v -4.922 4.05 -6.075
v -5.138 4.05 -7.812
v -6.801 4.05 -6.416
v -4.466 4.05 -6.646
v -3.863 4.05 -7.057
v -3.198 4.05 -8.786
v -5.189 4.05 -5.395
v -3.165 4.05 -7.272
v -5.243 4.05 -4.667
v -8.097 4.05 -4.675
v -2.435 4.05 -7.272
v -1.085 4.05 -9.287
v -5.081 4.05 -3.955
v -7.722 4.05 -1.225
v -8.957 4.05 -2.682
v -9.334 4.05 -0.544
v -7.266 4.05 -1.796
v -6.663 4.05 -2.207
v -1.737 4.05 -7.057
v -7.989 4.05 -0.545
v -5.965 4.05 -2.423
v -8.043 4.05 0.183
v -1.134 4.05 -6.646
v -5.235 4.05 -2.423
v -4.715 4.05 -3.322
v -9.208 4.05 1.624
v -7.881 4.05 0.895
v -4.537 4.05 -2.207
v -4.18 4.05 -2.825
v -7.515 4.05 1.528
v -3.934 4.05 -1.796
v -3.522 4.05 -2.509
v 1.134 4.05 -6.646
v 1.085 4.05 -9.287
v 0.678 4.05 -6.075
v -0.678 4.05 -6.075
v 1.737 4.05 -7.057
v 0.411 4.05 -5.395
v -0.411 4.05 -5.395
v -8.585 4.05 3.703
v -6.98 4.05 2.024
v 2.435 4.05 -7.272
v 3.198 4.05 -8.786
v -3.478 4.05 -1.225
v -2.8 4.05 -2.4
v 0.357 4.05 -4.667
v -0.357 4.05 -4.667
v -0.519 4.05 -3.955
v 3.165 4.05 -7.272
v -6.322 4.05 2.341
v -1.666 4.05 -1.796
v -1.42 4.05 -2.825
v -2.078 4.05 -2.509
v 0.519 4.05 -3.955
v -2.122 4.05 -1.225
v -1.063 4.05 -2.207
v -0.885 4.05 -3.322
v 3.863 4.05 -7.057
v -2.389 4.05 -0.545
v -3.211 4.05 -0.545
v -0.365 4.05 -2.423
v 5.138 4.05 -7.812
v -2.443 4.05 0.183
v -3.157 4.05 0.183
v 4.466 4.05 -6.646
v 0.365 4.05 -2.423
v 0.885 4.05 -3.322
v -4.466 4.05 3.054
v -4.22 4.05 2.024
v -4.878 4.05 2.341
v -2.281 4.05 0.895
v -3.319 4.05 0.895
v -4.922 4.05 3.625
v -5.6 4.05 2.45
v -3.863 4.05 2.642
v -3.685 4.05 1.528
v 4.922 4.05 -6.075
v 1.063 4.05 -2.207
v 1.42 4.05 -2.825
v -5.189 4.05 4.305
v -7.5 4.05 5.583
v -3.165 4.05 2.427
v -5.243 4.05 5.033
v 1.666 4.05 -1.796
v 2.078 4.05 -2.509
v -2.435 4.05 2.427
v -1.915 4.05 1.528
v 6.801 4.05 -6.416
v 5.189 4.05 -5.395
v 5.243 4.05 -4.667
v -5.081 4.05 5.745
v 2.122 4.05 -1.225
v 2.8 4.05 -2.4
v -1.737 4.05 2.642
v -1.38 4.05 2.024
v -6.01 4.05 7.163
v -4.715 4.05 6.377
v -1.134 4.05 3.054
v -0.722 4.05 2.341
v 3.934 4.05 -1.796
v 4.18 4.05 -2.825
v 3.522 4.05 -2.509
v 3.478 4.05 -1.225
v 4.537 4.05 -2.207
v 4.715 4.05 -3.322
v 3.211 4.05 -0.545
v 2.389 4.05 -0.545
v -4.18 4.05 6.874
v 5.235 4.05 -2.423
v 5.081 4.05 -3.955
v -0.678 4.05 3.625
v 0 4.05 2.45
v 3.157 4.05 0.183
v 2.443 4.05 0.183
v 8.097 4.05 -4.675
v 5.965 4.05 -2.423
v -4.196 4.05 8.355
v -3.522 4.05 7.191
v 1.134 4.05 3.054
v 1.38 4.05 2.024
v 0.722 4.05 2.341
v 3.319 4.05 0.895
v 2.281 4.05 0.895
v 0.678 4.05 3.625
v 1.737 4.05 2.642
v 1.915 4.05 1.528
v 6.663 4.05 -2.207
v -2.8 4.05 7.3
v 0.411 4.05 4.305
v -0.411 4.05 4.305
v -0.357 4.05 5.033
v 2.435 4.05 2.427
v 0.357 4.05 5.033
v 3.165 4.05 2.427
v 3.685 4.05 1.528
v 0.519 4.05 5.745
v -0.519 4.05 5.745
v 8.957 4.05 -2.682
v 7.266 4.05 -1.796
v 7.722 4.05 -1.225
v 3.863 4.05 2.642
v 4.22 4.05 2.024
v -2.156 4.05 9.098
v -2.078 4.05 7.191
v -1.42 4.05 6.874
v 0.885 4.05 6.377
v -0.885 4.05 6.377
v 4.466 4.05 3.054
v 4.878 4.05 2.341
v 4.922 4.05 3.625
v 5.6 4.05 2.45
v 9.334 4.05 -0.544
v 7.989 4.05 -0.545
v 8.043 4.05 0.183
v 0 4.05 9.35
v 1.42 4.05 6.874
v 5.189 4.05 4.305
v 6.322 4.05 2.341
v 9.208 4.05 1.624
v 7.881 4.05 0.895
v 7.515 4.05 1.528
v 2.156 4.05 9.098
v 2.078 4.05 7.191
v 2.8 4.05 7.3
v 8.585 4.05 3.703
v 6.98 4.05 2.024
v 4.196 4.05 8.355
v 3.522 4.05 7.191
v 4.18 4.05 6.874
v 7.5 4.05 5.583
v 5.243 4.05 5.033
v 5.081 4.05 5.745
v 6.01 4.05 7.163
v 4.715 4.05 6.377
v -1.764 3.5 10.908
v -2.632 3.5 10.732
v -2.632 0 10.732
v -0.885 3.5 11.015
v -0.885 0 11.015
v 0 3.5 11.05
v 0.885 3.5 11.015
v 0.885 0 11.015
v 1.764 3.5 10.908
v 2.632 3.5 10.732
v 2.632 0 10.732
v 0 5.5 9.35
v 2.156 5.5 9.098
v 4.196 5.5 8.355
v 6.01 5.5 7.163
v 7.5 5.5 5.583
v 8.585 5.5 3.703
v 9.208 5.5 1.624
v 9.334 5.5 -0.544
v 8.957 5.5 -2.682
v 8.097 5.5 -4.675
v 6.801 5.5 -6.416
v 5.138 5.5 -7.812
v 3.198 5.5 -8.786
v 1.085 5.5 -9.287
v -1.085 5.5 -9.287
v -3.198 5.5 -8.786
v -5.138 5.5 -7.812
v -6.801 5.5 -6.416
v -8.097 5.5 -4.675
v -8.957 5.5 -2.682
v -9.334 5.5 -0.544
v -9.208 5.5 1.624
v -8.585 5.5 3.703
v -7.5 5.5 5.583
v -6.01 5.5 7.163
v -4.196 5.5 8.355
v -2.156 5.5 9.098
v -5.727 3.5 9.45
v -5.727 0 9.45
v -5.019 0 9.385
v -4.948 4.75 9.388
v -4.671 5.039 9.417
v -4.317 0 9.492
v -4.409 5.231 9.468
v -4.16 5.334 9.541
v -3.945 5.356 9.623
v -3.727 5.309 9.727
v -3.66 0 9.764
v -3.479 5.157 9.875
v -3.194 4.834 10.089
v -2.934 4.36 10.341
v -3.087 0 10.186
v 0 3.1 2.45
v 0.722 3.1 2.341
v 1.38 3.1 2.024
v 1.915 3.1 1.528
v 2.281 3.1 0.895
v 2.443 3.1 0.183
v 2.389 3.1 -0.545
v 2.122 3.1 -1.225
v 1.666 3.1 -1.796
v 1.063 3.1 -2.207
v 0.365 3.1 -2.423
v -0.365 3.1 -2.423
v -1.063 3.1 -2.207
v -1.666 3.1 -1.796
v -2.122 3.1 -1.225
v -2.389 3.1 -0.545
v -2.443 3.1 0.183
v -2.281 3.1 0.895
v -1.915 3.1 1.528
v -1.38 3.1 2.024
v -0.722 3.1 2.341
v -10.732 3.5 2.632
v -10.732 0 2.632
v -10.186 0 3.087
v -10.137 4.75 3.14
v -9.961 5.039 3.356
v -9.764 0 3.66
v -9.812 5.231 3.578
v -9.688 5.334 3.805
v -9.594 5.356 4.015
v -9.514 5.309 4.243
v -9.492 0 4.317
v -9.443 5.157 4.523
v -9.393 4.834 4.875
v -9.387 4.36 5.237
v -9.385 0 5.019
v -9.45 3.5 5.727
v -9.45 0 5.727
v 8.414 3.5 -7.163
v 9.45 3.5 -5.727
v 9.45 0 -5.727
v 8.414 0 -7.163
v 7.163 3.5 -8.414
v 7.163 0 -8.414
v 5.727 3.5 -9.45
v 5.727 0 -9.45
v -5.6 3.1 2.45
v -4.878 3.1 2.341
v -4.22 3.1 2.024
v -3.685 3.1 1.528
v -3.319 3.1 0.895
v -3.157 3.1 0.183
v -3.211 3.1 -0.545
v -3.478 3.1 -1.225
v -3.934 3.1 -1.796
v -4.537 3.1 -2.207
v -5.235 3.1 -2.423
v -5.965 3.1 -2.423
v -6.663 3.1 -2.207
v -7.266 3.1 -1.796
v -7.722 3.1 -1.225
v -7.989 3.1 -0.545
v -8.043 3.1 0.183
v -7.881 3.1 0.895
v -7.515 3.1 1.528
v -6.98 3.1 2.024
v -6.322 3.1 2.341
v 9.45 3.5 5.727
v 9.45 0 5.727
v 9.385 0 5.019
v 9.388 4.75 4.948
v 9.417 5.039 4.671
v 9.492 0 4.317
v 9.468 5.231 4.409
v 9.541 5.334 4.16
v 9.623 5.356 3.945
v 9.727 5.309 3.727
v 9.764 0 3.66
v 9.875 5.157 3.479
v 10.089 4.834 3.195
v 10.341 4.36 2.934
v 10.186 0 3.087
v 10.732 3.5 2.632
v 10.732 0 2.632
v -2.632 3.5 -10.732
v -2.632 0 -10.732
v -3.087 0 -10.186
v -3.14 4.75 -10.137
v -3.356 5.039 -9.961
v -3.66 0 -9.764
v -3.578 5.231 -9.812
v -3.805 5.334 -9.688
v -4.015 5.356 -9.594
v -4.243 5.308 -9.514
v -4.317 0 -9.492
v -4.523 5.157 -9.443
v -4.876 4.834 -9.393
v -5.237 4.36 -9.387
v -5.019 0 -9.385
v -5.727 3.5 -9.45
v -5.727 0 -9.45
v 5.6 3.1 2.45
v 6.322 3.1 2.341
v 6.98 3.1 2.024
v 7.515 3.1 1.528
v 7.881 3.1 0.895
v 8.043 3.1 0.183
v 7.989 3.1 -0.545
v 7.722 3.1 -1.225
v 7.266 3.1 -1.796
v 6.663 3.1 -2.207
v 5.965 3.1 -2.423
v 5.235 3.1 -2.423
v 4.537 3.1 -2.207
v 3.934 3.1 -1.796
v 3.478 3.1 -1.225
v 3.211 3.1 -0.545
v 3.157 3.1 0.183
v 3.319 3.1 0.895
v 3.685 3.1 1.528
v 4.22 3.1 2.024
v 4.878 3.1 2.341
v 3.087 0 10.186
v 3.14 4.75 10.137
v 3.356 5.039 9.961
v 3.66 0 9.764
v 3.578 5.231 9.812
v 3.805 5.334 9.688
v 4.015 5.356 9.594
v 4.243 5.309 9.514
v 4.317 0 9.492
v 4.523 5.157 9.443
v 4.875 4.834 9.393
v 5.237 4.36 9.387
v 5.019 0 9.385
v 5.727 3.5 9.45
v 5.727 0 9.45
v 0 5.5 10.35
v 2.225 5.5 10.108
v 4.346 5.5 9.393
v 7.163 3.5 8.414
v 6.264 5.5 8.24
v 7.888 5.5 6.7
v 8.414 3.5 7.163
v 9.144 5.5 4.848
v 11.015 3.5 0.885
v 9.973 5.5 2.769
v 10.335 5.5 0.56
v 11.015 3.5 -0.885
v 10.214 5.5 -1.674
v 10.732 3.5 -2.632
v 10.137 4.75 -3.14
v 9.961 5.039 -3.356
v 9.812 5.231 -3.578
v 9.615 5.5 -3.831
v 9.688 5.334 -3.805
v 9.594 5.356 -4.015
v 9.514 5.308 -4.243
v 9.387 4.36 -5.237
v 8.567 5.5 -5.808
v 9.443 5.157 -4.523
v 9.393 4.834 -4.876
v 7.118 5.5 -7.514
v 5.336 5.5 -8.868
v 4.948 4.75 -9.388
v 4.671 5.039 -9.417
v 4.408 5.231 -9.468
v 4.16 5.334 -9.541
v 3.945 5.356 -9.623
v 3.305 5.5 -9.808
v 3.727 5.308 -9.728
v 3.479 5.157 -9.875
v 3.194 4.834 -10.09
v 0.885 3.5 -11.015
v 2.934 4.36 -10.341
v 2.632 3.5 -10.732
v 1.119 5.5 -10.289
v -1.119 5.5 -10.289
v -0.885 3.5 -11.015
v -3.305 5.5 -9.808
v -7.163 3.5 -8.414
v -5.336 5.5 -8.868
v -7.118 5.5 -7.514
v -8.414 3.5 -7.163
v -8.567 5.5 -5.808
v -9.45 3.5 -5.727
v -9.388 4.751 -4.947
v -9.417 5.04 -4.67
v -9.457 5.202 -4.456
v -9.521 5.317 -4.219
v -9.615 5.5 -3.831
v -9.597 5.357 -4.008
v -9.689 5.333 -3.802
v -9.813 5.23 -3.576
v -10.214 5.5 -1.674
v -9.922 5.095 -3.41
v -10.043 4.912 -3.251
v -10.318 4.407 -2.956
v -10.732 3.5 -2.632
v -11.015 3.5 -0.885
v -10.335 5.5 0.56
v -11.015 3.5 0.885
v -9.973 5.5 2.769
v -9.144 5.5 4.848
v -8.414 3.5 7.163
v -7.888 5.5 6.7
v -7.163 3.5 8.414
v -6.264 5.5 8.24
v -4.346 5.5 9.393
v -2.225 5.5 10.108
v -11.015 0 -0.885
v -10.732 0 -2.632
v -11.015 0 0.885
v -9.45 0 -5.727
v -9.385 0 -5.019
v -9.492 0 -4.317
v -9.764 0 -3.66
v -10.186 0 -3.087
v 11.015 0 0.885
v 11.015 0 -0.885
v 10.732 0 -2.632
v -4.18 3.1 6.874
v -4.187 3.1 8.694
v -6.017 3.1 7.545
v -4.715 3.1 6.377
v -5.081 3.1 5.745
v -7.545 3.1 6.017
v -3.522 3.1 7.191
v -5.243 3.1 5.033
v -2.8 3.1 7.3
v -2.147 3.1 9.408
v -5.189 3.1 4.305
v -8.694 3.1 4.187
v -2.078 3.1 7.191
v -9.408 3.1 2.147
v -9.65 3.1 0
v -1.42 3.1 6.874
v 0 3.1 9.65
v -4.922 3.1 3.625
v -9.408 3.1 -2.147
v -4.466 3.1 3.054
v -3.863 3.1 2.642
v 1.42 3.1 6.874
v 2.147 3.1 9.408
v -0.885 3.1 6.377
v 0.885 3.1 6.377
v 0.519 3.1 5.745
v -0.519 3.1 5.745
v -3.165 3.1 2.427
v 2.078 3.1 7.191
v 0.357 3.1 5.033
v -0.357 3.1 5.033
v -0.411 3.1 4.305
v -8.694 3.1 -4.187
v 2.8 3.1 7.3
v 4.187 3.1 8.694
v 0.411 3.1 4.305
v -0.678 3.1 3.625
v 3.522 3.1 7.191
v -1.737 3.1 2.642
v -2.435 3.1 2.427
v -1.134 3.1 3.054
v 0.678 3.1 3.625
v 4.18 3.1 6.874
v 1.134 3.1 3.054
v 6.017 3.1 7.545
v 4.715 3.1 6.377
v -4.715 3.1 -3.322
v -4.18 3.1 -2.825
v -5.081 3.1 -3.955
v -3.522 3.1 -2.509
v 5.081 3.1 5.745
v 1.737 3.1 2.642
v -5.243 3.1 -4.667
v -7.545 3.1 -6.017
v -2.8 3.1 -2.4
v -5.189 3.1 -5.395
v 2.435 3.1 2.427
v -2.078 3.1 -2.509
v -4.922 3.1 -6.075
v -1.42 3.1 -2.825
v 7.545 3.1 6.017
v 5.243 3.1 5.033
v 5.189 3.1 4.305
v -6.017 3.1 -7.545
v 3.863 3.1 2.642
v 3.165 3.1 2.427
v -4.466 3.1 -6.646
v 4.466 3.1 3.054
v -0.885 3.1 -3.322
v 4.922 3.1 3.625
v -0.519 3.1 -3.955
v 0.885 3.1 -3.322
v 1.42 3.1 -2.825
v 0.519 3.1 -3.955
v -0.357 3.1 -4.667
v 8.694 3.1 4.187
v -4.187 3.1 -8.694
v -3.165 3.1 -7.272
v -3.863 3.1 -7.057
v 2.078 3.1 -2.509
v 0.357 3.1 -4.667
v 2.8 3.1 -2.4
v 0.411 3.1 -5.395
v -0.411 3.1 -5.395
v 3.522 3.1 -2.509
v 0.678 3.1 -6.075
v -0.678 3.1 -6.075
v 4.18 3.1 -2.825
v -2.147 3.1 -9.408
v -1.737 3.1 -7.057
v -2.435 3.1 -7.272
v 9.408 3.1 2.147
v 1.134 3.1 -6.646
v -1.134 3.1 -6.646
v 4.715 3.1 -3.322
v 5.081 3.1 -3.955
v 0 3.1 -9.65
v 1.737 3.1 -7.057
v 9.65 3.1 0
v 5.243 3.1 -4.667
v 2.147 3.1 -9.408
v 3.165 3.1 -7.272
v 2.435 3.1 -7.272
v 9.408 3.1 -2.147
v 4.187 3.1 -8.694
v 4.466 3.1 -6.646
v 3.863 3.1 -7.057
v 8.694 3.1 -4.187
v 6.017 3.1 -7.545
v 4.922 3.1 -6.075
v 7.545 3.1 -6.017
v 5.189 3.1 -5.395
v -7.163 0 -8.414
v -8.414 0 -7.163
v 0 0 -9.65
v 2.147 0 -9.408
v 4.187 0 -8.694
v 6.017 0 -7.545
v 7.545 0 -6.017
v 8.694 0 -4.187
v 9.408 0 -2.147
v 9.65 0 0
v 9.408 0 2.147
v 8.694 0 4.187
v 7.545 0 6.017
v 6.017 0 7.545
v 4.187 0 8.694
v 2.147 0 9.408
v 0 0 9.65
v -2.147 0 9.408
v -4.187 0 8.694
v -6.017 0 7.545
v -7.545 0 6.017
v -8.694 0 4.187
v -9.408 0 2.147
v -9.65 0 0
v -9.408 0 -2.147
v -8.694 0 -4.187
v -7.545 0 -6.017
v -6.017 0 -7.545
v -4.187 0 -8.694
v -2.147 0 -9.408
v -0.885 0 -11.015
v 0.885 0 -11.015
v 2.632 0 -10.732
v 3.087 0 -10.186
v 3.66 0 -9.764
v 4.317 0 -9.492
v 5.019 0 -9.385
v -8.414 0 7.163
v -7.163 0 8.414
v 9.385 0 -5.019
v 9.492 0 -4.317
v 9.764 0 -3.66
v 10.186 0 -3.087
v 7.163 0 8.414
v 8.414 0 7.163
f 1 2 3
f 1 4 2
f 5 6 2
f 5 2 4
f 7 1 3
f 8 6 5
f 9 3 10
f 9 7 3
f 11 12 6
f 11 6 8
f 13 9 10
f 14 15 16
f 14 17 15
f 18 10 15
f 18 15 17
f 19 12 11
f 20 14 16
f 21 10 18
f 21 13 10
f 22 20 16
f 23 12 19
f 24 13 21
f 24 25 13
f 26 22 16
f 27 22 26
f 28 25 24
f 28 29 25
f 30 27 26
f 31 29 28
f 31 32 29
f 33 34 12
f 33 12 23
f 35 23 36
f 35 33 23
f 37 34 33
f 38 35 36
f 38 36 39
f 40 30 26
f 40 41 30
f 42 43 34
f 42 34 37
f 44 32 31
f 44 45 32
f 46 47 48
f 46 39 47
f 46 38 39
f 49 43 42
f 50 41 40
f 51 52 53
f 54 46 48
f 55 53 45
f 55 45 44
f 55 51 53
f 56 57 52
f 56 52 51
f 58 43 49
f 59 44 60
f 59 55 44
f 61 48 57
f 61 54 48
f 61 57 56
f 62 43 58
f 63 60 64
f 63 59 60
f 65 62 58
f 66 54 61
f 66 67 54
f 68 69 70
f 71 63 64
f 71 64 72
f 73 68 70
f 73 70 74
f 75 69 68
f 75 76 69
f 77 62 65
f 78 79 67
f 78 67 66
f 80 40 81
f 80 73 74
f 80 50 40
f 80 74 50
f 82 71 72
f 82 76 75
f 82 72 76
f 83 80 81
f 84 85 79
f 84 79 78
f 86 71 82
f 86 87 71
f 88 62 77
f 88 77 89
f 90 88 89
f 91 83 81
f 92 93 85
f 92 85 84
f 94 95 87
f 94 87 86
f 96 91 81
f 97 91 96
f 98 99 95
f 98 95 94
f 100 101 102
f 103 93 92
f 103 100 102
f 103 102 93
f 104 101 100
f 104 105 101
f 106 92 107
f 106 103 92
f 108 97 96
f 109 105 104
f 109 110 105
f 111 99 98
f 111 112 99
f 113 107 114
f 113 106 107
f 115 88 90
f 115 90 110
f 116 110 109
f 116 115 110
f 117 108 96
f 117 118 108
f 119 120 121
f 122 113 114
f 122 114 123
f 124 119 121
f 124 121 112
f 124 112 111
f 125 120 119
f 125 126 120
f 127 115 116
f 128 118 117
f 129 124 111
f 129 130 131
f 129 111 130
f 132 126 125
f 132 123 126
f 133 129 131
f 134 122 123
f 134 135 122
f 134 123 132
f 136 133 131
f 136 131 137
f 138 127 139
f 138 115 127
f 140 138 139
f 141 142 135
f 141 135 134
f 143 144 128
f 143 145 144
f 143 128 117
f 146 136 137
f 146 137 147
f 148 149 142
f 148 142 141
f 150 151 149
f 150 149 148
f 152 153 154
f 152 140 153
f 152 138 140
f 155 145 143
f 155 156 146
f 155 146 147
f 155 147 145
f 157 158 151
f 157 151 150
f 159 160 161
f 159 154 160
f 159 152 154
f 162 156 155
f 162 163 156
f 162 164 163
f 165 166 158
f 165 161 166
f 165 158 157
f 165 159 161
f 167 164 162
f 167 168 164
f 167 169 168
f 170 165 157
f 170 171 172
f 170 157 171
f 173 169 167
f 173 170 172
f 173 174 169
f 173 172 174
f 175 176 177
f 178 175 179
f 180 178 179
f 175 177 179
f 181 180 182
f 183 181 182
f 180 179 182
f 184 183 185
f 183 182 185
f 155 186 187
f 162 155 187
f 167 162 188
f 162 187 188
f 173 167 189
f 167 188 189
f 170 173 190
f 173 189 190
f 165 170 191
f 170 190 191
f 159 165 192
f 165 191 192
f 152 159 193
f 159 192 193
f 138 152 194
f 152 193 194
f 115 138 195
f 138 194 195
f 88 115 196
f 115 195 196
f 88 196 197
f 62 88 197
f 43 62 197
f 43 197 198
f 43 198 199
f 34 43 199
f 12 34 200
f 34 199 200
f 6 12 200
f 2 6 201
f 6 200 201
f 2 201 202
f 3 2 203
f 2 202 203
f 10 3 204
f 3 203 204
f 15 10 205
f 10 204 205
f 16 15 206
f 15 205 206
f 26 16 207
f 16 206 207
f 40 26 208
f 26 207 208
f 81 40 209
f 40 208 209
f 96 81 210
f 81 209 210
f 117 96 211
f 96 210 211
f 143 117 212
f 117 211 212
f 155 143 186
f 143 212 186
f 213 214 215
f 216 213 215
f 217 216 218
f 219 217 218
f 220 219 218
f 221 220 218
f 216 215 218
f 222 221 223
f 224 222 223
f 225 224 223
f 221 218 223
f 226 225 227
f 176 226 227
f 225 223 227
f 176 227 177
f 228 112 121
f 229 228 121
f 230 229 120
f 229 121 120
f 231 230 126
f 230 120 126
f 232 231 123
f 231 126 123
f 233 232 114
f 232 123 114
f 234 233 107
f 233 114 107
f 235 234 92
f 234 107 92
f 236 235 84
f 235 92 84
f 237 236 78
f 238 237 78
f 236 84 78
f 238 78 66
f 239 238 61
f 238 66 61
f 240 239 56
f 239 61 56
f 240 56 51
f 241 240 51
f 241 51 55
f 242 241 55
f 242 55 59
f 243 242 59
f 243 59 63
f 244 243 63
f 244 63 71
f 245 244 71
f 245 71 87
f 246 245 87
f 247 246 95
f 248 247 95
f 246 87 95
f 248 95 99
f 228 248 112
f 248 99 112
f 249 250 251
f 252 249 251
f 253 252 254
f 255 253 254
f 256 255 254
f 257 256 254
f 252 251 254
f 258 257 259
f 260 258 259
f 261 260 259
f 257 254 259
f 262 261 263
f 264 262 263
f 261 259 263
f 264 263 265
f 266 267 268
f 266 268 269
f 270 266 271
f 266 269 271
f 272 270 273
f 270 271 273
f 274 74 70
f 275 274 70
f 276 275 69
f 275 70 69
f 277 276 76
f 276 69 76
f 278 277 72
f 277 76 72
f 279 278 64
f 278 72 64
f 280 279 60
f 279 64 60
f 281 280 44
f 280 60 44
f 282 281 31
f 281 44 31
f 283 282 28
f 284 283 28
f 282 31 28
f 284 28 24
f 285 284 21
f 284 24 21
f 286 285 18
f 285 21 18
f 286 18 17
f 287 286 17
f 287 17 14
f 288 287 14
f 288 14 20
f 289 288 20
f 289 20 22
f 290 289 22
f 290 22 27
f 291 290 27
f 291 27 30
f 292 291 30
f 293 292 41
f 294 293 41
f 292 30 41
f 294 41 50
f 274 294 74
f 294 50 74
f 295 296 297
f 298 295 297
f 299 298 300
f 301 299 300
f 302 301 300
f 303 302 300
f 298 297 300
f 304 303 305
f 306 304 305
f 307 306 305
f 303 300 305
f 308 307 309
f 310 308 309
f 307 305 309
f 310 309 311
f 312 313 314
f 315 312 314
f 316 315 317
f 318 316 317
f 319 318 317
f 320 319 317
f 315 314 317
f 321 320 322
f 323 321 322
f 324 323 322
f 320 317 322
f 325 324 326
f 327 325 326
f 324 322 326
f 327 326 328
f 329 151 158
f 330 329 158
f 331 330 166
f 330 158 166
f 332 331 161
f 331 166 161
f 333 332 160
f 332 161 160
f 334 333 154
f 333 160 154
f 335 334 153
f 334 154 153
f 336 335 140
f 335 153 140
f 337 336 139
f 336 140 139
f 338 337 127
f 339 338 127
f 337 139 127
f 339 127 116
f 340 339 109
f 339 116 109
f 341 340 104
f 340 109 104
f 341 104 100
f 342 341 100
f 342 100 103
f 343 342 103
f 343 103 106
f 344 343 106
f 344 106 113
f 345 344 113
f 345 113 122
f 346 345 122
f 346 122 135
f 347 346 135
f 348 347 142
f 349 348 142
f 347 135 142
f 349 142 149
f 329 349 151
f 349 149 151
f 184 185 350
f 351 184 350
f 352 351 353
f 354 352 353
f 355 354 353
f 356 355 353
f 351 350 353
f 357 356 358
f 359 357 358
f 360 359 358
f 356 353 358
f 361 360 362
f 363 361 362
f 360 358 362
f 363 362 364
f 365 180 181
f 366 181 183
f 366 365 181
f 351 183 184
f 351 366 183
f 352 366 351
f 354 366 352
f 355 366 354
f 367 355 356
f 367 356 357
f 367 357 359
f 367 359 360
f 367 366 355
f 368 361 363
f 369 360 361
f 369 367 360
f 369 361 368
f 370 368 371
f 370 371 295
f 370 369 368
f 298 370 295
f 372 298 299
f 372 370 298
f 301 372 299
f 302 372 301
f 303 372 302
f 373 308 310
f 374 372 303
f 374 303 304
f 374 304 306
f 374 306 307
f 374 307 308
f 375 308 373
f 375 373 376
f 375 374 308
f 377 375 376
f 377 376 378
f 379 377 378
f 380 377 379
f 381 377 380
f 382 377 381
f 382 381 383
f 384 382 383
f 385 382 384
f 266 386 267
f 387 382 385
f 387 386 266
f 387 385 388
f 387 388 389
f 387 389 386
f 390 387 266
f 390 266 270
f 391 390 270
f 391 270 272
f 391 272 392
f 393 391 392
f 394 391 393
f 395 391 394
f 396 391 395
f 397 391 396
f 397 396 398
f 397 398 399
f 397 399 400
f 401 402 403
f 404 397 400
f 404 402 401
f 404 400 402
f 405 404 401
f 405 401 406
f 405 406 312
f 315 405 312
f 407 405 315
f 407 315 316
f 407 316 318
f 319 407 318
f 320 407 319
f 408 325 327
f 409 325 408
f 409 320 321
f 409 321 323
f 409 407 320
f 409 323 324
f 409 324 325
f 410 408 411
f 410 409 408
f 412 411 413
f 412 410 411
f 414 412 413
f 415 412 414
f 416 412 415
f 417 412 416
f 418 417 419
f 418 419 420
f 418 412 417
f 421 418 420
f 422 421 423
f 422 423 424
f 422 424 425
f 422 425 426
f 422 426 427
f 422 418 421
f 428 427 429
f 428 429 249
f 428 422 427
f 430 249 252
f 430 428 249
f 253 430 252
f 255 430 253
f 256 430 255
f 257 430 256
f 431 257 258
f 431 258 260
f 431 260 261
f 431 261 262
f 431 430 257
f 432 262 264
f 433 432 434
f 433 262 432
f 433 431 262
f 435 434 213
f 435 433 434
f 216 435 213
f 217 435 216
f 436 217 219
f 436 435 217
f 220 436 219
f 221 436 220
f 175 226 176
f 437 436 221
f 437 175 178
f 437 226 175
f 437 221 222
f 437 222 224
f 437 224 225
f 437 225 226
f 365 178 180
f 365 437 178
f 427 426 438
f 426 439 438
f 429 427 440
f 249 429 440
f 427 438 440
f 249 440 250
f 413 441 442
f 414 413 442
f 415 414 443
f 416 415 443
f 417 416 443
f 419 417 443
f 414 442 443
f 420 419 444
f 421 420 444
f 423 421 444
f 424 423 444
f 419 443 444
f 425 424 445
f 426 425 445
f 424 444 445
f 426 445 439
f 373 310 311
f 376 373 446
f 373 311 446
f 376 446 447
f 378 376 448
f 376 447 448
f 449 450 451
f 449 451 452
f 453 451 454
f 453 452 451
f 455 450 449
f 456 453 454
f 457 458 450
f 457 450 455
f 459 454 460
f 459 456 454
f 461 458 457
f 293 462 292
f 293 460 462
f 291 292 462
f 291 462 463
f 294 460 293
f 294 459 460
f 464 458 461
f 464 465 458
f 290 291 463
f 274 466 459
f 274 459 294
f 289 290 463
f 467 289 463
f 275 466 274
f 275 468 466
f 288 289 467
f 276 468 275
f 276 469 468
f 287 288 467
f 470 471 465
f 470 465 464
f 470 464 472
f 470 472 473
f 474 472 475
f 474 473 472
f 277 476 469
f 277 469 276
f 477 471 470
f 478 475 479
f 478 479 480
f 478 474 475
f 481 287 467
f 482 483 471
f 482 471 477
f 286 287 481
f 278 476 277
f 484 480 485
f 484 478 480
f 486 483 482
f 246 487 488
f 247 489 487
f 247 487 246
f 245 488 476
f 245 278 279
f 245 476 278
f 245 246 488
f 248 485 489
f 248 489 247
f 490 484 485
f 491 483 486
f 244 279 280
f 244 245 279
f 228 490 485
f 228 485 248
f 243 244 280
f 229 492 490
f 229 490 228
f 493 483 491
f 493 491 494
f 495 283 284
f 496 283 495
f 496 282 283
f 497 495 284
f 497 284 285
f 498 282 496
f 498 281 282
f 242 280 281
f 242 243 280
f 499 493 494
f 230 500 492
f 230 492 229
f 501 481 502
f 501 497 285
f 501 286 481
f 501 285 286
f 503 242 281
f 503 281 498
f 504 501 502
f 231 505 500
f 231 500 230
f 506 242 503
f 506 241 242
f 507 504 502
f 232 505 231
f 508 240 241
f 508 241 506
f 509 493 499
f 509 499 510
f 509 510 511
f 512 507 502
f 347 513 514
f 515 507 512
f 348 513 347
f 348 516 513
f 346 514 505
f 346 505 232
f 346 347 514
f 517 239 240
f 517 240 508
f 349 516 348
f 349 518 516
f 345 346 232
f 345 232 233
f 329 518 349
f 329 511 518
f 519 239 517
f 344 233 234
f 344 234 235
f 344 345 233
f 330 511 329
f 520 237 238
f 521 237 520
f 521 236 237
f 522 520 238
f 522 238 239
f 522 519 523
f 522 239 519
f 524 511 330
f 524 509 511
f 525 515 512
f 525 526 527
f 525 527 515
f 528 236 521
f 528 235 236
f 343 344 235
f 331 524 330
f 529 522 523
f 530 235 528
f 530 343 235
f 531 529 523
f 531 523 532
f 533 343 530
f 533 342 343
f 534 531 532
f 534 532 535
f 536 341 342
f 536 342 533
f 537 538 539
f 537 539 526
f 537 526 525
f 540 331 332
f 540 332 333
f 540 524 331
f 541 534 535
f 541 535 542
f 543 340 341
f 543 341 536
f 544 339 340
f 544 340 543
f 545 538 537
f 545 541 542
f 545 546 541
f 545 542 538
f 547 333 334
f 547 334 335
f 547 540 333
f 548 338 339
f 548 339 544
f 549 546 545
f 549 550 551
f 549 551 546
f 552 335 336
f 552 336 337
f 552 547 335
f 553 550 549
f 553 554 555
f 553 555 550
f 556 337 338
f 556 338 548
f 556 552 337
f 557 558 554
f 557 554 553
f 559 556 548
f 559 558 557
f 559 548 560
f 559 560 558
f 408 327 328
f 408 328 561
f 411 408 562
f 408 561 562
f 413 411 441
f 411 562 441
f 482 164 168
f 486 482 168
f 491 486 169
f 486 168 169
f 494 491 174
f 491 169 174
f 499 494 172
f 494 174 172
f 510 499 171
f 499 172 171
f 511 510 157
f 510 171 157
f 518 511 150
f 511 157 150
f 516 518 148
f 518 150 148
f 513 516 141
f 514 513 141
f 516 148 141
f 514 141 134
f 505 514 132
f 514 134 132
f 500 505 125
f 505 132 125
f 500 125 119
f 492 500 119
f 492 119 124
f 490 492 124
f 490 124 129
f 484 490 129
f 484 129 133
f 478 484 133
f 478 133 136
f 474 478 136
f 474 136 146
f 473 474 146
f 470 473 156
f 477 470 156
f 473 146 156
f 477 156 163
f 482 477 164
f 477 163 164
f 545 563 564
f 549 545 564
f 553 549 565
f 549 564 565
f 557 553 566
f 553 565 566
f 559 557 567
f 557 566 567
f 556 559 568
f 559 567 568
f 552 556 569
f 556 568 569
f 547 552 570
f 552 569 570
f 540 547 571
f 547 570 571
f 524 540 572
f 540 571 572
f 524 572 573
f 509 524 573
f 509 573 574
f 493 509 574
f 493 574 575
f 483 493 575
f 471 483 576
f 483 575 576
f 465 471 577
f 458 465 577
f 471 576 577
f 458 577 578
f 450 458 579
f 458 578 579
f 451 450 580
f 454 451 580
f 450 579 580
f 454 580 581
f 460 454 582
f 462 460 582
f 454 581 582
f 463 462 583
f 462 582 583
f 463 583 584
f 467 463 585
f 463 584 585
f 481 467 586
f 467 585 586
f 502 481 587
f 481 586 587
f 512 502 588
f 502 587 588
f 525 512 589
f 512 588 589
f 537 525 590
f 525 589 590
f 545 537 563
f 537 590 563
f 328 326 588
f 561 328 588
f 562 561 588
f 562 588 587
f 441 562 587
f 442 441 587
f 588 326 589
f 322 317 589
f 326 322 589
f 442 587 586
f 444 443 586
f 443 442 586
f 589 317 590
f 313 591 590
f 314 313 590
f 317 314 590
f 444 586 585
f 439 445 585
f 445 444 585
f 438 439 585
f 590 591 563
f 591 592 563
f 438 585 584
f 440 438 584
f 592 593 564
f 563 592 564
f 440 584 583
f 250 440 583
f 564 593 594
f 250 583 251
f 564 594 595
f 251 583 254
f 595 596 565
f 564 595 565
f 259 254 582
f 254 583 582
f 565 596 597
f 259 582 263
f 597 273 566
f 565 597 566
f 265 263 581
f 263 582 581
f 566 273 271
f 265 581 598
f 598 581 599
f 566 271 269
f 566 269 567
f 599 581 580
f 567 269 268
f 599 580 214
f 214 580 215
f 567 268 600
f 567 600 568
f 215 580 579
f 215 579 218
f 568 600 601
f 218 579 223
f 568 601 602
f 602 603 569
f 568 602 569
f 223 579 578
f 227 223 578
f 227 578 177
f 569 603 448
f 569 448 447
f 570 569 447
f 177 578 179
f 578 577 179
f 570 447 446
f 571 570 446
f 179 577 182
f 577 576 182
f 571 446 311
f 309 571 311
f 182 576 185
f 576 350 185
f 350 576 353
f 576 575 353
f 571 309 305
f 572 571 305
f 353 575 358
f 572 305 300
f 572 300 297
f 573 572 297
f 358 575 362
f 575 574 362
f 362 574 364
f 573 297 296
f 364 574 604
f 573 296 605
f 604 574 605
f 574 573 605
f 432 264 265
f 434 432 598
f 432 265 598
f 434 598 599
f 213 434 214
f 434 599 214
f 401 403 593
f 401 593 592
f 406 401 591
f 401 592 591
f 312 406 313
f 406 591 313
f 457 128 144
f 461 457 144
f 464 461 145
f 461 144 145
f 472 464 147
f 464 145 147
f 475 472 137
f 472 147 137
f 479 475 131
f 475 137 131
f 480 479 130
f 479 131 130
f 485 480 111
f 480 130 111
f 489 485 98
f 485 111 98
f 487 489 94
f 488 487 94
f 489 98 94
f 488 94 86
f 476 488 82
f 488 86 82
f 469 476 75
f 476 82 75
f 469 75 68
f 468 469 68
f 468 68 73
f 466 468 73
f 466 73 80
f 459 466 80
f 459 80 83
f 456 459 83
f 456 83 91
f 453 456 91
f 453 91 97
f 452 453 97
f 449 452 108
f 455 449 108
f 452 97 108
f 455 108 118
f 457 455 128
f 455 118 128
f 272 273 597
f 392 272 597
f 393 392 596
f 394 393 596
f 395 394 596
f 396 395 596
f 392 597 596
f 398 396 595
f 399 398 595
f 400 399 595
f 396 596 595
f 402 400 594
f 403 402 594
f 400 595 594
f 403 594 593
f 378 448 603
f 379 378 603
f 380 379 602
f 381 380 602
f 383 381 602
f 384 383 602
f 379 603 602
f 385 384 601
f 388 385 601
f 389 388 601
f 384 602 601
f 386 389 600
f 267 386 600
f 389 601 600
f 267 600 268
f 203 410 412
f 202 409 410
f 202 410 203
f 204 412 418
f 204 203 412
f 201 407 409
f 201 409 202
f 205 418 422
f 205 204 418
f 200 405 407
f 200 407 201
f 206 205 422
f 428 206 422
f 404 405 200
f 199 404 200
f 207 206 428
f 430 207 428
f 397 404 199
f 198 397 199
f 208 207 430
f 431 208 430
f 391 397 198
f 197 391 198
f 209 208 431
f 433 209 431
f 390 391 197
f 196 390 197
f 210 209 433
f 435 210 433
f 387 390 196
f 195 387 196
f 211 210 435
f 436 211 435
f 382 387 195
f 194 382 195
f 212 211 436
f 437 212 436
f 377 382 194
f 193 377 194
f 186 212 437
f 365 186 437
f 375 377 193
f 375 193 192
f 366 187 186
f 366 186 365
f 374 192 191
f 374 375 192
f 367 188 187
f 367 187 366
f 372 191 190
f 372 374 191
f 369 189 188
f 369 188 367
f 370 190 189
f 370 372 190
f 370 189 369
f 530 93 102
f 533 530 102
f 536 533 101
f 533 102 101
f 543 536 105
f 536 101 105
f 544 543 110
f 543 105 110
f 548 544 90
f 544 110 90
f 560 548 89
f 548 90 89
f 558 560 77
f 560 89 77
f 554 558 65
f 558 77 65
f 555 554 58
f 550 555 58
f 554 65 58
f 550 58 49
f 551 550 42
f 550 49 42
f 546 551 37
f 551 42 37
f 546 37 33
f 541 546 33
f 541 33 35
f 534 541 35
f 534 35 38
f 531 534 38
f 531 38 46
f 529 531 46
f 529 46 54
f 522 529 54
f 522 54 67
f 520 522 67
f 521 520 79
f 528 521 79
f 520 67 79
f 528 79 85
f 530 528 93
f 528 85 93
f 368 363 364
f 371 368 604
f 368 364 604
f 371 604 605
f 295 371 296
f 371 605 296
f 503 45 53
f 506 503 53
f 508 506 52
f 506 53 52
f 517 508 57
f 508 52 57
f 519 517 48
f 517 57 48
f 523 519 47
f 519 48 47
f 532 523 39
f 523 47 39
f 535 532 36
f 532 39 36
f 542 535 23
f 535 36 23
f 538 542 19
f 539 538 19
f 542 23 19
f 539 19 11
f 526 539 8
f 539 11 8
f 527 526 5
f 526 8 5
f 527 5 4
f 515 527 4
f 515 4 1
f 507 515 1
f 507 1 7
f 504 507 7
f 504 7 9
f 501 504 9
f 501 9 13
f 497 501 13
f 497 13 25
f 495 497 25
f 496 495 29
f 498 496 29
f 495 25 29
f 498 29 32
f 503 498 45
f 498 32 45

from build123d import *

# Parameters (mm, degrees)
CROQUIS1_R              = 11.05
SALIENTE_EXTRUIR1_DEPTH = 5.5
CHAFL_N1_SIZE           = 2
CHAFL_N1_SIZE2          = 0.7
CROQUIS2_R              = 9.35
CORTAR_EXTRUIR1_DEPTH   = 1.45
CROQUIS3_R              = 9.65
CORTAR_EXTRUIR2_DEPTH   = 3.1
CROQUIS4_R              = 2.45
CORTAR_EXTRUIR3_DEPTH   = 0.95
CROQUIS5_R              = 2.94693617
CORTAR_EXTRUIR4_DEPTH   = 7


with BuildPart() as part:
    # Croquis1 → Saliente-Extruir1 (new body)
    with BuildSketch(Plane(origin=(0, 0, 0), x_dir=(1, 0, 0), z_dir=(0, 1, 0))):
        with Locations(Location((0, 0, 0), (0, 0, 270))):
            Circle(CROQUIS1_R)
    extrude(amount=SALIENTE_EXTRUIR1_DEPTH)

    # Chaflán1
    chafl_n1_edges = [part.edges().sort_by_distance(p)[0] for p in [
        (0, 5.5, -11.05),
    ]]
    chafl_n1_side = [part.faces().sort_by_distance(p)[0] for p in [
        (0, 2.75, -11.05),
    ]]
    chamfer(chafl_n1_edges, length=CHAFL_N1_SIZE, length2=CHAFL_N1_SIZE2, reference=chafl_n1_side[0])

    # Croquis2 → Cortar-Extruir1 (cut)
    with BuildSketch(Plane(origin=(0, 5.5, 0), x_dir=(1, 0, 0), z_dir=(0, 1, 0))):
        with Locations(Location((0, 0, 0), (0, 0, 270))):
            Circle(CROQUIS2_R)
    extrude(amount=-CORTAR_EXTRUIR1_DEPTH, mode=Mode.SUBTRACT)

    # Croquis3 → Cortar-Extruir2 (cut)
    with BuildSketch(Plane.XZ):
        with Locations(Location((0, 0, 0), (0, 0, 270))):
            Circle(CROQUIS3_R)
    extrude(amount=-CORTAR_EXTRUIR2_DEPTH, mode=Mode.SUBTRACT)

    # Croquis4 → Cortar-Extruir3 (cut)
    with BuildSketch(Plane(origin=(0, 4.05, 0), x_dir=(1, 0, 0), z_dir=(0, 1, 0))):
        with Locations(Location((0, 0, 0), (0, 0, 270))):
            Circle(CROQUIS4_R)
        with Locations(Location((5.6, 0, 0), (0, 0, 270))):
            Circle(CROQUIS4_R)
        with Locations(Location((2.8, 4.849742261, 0), (0, 0, 270))):
            Circle(CROQUIS4_R)
        with Locations(Location((-2.8, 4.849742261, 0), (0, 0, 270))):
            Circle(CROQUIS4_R)
        with Locations(Location((-5.6, 0, 0), (0, 0, 270))):
            Circle(CROQUIS4_R)
        with Locations(Location((-2.8, -4.849742261, 0), (0, 0, 270))):
            Circle(CROQUIS4_R)
        with Locations(Location((2.8, -4.849742261, 0), (0, 0, 270))):
            Circle(CROQUIS4_R)
    extrude(amount=-CORTAR_EXTRUIR3_DEPTH, mode=Mode.SUBTRACT)

    # Croquis5 → Cortar-Extruir4 (cut)
    with BuildSketch(Plane.XZ):
        with Locations((5.107651345, 12.330961149)):
            Circle(CROQUIS5_R)
        with Locations((12.330961149, 5.107651345)):
            Circle(CROQUIS5_R)
        with Locations((12.330961149, -5.107651345)):
            Circle(CROQUIS5_R)
        with Locations((5.107651345, -12.330961149)):
            Circle(CROQUIS5_R)
        with Locations((-5.107651345, -12.330961149)):
            Circle(CROQUIS5_R)
        with Locations((-12.330961149, -5.107651345)):
            Circle(CROQUIS5_R)
        with Locations((-12.330961149, 5.107651345)):
            Circle(CROQUIS5_R)
        with Locations((-5.107651345, 12.330961149)):
            Circle(CROQUIS5_R)
    extrude(amount=-CORTAR_EXTRUIR4_DEPTH, mode=Mode.SUBTRACT)


solid = part.part
